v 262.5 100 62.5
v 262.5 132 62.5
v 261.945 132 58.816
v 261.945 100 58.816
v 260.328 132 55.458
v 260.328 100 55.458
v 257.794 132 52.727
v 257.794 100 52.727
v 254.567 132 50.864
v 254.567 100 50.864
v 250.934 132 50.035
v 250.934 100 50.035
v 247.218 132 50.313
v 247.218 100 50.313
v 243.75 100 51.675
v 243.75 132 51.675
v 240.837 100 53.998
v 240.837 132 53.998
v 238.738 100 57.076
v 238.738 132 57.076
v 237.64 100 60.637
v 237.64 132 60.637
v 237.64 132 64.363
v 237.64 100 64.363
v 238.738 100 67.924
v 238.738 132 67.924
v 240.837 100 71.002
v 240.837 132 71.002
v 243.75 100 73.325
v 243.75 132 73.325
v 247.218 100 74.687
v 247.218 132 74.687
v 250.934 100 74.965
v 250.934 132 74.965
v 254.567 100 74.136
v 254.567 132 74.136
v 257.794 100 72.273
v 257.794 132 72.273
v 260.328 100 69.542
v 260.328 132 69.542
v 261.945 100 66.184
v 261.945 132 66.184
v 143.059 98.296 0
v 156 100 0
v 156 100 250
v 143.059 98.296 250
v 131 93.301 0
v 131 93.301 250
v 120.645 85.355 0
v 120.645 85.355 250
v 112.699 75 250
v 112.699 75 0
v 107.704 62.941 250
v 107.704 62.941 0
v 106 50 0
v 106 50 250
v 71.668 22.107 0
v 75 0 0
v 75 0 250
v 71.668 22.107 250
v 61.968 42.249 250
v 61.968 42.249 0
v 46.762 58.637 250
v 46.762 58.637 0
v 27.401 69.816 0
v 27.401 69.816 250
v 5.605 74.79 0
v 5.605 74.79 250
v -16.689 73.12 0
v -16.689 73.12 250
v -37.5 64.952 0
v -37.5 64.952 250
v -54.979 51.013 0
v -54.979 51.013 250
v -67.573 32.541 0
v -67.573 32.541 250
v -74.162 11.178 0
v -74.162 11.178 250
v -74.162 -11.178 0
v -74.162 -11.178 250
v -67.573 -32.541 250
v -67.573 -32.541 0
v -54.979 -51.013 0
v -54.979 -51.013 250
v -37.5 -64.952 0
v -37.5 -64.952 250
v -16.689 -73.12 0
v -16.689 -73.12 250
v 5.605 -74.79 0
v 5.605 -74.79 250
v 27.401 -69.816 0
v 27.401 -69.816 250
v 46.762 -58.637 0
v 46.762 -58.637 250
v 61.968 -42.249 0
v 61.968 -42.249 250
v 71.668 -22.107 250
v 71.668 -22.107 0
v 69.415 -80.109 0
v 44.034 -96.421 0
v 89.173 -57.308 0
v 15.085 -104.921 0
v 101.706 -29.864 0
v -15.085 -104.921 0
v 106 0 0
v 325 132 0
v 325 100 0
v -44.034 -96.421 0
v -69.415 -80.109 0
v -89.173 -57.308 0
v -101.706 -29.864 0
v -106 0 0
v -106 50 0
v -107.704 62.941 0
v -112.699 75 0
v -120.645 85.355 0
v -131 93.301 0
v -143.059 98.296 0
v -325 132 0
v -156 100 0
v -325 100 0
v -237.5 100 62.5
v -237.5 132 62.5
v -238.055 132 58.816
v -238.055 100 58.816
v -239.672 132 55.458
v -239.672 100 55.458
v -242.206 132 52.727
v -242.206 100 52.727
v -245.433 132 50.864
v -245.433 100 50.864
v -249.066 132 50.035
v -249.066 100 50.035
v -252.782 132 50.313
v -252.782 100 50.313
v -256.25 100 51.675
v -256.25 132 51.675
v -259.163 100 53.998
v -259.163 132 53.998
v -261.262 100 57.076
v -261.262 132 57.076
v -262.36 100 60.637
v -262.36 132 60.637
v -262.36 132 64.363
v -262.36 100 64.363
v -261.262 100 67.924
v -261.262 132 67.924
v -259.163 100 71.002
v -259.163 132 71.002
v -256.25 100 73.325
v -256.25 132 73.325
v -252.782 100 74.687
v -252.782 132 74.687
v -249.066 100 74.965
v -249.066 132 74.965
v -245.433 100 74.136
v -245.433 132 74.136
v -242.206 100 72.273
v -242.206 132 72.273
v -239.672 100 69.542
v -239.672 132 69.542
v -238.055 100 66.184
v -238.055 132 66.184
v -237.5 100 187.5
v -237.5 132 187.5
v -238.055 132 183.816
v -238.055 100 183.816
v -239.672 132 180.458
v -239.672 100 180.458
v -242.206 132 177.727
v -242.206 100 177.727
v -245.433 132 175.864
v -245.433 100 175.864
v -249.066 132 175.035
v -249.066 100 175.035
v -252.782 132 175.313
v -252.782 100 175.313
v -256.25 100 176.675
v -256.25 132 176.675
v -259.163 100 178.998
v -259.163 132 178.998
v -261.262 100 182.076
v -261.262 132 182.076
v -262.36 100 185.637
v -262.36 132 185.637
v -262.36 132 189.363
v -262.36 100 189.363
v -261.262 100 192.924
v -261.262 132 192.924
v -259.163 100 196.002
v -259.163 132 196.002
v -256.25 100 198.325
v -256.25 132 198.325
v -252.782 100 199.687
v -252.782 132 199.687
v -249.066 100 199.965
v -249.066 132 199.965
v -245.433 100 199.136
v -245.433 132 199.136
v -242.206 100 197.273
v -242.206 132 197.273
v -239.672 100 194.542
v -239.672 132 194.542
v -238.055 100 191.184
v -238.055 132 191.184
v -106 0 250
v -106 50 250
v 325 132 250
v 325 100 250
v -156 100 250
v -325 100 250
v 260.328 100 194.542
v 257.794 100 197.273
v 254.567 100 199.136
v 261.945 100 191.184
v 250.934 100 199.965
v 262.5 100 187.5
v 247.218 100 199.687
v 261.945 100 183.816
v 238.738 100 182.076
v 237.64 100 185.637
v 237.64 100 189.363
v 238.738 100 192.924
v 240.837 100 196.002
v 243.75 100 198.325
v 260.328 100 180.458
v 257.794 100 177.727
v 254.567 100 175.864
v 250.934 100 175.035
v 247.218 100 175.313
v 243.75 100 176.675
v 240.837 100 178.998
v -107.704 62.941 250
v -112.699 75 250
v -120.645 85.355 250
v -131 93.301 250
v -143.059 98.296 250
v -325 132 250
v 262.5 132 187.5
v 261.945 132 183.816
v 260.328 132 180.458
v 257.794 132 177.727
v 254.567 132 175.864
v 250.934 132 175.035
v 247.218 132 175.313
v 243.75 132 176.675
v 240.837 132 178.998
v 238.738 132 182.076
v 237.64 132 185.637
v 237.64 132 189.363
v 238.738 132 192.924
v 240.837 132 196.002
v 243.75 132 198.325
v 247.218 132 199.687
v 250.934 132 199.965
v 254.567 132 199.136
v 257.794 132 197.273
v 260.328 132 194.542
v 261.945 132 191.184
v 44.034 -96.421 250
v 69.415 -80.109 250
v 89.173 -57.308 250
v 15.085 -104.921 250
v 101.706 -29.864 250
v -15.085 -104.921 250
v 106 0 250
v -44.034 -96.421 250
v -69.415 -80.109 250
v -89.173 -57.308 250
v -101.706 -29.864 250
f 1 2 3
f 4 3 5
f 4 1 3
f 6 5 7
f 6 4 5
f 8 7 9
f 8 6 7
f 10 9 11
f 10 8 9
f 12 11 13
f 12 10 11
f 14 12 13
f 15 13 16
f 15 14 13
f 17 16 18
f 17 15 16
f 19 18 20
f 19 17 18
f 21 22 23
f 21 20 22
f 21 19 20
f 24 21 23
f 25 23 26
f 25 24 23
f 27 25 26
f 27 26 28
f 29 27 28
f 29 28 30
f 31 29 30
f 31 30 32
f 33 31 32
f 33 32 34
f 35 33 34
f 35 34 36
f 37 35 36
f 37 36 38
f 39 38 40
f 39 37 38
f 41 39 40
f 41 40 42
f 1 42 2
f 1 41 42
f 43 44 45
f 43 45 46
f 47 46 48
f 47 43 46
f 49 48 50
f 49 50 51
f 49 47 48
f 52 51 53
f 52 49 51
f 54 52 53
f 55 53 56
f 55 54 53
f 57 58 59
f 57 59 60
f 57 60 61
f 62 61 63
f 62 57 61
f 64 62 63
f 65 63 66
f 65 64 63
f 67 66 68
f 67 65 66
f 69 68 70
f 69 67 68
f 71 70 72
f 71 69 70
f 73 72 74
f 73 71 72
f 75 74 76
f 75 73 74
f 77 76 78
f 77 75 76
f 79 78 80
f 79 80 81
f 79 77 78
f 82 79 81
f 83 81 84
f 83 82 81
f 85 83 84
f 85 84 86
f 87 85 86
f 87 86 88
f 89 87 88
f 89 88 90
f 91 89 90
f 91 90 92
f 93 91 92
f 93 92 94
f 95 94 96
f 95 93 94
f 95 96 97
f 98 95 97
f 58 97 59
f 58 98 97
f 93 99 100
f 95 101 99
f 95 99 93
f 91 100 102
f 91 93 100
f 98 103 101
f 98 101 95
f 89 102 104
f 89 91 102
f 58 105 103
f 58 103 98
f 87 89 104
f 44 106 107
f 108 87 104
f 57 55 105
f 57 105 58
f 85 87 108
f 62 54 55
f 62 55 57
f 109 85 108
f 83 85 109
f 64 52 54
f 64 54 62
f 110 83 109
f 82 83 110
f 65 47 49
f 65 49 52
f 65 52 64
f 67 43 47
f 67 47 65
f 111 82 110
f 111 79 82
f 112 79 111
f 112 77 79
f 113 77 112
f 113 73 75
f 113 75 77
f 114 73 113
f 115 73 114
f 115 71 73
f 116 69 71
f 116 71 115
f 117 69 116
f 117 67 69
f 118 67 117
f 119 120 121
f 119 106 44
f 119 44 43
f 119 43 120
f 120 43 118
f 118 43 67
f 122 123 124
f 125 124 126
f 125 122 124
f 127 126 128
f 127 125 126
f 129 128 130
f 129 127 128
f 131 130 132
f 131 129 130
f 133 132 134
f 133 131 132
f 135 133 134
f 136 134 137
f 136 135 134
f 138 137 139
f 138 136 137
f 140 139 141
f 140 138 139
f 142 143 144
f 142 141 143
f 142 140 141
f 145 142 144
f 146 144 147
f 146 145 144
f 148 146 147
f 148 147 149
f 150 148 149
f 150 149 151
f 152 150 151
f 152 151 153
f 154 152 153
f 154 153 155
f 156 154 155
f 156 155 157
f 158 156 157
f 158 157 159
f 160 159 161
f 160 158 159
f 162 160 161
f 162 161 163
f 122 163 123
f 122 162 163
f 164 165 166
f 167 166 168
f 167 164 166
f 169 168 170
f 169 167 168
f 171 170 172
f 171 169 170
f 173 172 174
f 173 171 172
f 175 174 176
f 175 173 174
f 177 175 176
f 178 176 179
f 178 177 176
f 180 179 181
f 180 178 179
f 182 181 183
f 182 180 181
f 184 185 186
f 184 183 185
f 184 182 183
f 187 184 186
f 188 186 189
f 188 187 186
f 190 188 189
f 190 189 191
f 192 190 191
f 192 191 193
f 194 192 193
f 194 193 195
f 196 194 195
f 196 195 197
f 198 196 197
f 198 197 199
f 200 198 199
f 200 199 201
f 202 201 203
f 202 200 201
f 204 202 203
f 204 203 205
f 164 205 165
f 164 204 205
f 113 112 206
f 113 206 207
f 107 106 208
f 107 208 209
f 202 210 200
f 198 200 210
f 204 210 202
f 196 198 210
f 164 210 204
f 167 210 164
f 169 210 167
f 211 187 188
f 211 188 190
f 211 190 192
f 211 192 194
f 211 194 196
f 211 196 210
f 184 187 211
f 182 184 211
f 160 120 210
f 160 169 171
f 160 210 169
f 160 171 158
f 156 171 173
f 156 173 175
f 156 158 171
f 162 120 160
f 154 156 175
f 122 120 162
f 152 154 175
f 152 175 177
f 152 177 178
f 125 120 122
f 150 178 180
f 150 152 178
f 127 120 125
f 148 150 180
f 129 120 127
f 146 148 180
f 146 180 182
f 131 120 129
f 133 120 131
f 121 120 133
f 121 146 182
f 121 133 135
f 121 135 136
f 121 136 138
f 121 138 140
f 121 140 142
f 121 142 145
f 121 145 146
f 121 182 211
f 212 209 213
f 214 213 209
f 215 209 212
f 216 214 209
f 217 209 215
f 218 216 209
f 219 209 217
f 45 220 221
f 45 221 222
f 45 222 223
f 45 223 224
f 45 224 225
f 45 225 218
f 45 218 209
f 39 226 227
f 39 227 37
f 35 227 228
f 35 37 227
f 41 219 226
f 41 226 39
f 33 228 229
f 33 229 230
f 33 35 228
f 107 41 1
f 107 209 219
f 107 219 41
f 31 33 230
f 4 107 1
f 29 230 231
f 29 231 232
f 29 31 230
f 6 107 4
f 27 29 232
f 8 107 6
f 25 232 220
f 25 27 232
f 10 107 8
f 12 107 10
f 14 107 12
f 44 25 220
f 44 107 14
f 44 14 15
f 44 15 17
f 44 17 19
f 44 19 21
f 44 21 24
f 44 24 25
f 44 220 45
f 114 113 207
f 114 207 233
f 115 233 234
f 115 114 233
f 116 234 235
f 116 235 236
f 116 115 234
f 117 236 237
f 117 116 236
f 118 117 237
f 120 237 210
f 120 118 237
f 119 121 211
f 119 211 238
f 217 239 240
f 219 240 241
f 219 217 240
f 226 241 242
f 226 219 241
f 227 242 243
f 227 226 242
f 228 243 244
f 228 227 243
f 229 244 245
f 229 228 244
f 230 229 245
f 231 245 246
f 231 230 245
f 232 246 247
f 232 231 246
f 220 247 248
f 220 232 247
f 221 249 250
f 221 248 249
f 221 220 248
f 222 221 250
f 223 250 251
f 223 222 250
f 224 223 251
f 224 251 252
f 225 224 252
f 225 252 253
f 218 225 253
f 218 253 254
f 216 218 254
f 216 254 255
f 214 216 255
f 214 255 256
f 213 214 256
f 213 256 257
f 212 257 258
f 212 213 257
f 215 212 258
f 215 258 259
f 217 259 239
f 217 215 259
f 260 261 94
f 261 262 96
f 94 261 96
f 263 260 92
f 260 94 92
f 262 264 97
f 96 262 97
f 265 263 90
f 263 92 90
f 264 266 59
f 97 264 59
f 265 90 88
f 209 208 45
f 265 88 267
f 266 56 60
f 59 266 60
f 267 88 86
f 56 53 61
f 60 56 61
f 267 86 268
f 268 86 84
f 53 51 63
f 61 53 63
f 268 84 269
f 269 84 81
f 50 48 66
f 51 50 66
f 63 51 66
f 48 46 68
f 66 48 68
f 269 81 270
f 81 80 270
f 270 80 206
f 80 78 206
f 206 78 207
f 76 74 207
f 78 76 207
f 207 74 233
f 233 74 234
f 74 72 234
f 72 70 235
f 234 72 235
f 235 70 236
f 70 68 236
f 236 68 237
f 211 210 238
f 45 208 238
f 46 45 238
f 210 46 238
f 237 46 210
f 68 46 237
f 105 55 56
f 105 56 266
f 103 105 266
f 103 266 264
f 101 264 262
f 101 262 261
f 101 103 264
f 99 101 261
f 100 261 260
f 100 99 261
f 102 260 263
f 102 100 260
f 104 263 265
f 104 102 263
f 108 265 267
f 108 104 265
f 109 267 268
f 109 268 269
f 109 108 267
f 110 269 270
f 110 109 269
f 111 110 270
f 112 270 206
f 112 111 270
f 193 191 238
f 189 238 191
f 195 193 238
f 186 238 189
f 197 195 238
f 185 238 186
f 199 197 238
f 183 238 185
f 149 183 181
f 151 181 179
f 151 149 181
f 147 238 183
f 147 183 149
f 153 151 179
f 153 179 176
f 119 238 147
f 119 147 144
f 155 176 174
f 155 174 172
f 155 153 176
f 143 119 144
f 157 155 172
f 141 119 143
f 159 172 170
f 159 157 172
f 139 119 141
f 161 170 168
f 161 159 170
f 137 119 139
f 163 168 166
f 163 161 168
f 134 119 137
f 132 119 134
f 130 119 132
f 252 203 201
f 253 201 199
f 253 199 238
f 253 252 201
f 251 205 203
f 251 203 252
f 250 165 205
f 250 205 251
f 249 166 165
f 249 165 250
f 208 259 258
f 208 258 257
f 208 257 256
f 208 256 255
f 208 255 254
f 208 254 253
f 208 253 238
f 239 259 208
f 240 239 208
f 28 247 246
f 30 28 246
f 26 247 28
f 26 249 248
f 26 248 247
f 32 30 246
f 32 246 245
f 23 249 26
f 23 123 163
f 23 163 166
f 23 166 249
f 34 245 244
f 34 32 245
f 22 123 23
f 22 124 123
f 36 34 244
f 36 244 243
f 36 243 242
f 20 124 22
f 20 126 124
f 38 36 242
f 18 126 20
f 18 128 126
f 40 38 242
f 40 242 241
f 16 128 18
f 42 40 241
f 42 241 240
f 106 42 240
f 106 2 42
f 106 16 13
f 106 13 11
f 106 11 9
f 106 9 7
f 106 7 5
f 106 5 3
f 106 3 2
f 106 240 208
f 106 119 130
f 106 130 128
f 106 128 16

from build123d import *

# Parameters (mm, degrees)
SKETCH1_R           = 75
BOSS_EXTRUDE1_DEPTH = 250
CUT_EXTRUDE1_START  = 100
SKETCH2_R           = 12.5
CUT_EXTRUDE1_DEPTH  = 33


with BuildPart() as part:
    # Sketch1 → Boss-Extrude1 (new body)
    with BuildSketch(Plane.XY):
        with BuildLine():
            Line((-325, 132), (325, 132))
            Line((325, 132), (325, 100))
            Line((325, 100), (156, 100))
            ThreePointArc((156, 100), (120.644660941, 85.355339059), (106, 50))
            Line((106, 50), (106, 0))
            ThreePointArc((106, 0), (0, -106), (-106, 0))
            Line((-106, 0), (-106, 50))
            ThreePointArc((-106, 50), (-120.644660941, 85.355339059), (-156, 100))
            Line((-156, 100), (-325, 100))
            Line((-325, 100), (-325, 132))
        make_face()
        Circle(SKETCH1_R, mode=Mode.SUBTRACT)
    extrude(amount=BOSS_EXTRUDE1_DEPTH)

    # Sketch2 → Cut-Extrude1 (cut, through all)
    with BuildSketch(Plane(origin=(0, 0, 0), x_dir=(1, 0, 0), z_dir=(0, 1, 0)).offset(CUT_EXTRUDE1_START)):
        with Locations((-250, -62.5)):
            Circle(SKETCH2_R)
        with Locations((250, -62.5)):
            Circle(SKETCH2_R)
        with Locations((250, -187.5)):
            Circle(SKETCH2_R)
        with Locations((-250, -187.5)):
            Circle(SKETCH2_R)
    extrude(amount=CUT_EXTRUDE1_DEPTH, mode=Mode.SUBTRACT)


solid = part.part
